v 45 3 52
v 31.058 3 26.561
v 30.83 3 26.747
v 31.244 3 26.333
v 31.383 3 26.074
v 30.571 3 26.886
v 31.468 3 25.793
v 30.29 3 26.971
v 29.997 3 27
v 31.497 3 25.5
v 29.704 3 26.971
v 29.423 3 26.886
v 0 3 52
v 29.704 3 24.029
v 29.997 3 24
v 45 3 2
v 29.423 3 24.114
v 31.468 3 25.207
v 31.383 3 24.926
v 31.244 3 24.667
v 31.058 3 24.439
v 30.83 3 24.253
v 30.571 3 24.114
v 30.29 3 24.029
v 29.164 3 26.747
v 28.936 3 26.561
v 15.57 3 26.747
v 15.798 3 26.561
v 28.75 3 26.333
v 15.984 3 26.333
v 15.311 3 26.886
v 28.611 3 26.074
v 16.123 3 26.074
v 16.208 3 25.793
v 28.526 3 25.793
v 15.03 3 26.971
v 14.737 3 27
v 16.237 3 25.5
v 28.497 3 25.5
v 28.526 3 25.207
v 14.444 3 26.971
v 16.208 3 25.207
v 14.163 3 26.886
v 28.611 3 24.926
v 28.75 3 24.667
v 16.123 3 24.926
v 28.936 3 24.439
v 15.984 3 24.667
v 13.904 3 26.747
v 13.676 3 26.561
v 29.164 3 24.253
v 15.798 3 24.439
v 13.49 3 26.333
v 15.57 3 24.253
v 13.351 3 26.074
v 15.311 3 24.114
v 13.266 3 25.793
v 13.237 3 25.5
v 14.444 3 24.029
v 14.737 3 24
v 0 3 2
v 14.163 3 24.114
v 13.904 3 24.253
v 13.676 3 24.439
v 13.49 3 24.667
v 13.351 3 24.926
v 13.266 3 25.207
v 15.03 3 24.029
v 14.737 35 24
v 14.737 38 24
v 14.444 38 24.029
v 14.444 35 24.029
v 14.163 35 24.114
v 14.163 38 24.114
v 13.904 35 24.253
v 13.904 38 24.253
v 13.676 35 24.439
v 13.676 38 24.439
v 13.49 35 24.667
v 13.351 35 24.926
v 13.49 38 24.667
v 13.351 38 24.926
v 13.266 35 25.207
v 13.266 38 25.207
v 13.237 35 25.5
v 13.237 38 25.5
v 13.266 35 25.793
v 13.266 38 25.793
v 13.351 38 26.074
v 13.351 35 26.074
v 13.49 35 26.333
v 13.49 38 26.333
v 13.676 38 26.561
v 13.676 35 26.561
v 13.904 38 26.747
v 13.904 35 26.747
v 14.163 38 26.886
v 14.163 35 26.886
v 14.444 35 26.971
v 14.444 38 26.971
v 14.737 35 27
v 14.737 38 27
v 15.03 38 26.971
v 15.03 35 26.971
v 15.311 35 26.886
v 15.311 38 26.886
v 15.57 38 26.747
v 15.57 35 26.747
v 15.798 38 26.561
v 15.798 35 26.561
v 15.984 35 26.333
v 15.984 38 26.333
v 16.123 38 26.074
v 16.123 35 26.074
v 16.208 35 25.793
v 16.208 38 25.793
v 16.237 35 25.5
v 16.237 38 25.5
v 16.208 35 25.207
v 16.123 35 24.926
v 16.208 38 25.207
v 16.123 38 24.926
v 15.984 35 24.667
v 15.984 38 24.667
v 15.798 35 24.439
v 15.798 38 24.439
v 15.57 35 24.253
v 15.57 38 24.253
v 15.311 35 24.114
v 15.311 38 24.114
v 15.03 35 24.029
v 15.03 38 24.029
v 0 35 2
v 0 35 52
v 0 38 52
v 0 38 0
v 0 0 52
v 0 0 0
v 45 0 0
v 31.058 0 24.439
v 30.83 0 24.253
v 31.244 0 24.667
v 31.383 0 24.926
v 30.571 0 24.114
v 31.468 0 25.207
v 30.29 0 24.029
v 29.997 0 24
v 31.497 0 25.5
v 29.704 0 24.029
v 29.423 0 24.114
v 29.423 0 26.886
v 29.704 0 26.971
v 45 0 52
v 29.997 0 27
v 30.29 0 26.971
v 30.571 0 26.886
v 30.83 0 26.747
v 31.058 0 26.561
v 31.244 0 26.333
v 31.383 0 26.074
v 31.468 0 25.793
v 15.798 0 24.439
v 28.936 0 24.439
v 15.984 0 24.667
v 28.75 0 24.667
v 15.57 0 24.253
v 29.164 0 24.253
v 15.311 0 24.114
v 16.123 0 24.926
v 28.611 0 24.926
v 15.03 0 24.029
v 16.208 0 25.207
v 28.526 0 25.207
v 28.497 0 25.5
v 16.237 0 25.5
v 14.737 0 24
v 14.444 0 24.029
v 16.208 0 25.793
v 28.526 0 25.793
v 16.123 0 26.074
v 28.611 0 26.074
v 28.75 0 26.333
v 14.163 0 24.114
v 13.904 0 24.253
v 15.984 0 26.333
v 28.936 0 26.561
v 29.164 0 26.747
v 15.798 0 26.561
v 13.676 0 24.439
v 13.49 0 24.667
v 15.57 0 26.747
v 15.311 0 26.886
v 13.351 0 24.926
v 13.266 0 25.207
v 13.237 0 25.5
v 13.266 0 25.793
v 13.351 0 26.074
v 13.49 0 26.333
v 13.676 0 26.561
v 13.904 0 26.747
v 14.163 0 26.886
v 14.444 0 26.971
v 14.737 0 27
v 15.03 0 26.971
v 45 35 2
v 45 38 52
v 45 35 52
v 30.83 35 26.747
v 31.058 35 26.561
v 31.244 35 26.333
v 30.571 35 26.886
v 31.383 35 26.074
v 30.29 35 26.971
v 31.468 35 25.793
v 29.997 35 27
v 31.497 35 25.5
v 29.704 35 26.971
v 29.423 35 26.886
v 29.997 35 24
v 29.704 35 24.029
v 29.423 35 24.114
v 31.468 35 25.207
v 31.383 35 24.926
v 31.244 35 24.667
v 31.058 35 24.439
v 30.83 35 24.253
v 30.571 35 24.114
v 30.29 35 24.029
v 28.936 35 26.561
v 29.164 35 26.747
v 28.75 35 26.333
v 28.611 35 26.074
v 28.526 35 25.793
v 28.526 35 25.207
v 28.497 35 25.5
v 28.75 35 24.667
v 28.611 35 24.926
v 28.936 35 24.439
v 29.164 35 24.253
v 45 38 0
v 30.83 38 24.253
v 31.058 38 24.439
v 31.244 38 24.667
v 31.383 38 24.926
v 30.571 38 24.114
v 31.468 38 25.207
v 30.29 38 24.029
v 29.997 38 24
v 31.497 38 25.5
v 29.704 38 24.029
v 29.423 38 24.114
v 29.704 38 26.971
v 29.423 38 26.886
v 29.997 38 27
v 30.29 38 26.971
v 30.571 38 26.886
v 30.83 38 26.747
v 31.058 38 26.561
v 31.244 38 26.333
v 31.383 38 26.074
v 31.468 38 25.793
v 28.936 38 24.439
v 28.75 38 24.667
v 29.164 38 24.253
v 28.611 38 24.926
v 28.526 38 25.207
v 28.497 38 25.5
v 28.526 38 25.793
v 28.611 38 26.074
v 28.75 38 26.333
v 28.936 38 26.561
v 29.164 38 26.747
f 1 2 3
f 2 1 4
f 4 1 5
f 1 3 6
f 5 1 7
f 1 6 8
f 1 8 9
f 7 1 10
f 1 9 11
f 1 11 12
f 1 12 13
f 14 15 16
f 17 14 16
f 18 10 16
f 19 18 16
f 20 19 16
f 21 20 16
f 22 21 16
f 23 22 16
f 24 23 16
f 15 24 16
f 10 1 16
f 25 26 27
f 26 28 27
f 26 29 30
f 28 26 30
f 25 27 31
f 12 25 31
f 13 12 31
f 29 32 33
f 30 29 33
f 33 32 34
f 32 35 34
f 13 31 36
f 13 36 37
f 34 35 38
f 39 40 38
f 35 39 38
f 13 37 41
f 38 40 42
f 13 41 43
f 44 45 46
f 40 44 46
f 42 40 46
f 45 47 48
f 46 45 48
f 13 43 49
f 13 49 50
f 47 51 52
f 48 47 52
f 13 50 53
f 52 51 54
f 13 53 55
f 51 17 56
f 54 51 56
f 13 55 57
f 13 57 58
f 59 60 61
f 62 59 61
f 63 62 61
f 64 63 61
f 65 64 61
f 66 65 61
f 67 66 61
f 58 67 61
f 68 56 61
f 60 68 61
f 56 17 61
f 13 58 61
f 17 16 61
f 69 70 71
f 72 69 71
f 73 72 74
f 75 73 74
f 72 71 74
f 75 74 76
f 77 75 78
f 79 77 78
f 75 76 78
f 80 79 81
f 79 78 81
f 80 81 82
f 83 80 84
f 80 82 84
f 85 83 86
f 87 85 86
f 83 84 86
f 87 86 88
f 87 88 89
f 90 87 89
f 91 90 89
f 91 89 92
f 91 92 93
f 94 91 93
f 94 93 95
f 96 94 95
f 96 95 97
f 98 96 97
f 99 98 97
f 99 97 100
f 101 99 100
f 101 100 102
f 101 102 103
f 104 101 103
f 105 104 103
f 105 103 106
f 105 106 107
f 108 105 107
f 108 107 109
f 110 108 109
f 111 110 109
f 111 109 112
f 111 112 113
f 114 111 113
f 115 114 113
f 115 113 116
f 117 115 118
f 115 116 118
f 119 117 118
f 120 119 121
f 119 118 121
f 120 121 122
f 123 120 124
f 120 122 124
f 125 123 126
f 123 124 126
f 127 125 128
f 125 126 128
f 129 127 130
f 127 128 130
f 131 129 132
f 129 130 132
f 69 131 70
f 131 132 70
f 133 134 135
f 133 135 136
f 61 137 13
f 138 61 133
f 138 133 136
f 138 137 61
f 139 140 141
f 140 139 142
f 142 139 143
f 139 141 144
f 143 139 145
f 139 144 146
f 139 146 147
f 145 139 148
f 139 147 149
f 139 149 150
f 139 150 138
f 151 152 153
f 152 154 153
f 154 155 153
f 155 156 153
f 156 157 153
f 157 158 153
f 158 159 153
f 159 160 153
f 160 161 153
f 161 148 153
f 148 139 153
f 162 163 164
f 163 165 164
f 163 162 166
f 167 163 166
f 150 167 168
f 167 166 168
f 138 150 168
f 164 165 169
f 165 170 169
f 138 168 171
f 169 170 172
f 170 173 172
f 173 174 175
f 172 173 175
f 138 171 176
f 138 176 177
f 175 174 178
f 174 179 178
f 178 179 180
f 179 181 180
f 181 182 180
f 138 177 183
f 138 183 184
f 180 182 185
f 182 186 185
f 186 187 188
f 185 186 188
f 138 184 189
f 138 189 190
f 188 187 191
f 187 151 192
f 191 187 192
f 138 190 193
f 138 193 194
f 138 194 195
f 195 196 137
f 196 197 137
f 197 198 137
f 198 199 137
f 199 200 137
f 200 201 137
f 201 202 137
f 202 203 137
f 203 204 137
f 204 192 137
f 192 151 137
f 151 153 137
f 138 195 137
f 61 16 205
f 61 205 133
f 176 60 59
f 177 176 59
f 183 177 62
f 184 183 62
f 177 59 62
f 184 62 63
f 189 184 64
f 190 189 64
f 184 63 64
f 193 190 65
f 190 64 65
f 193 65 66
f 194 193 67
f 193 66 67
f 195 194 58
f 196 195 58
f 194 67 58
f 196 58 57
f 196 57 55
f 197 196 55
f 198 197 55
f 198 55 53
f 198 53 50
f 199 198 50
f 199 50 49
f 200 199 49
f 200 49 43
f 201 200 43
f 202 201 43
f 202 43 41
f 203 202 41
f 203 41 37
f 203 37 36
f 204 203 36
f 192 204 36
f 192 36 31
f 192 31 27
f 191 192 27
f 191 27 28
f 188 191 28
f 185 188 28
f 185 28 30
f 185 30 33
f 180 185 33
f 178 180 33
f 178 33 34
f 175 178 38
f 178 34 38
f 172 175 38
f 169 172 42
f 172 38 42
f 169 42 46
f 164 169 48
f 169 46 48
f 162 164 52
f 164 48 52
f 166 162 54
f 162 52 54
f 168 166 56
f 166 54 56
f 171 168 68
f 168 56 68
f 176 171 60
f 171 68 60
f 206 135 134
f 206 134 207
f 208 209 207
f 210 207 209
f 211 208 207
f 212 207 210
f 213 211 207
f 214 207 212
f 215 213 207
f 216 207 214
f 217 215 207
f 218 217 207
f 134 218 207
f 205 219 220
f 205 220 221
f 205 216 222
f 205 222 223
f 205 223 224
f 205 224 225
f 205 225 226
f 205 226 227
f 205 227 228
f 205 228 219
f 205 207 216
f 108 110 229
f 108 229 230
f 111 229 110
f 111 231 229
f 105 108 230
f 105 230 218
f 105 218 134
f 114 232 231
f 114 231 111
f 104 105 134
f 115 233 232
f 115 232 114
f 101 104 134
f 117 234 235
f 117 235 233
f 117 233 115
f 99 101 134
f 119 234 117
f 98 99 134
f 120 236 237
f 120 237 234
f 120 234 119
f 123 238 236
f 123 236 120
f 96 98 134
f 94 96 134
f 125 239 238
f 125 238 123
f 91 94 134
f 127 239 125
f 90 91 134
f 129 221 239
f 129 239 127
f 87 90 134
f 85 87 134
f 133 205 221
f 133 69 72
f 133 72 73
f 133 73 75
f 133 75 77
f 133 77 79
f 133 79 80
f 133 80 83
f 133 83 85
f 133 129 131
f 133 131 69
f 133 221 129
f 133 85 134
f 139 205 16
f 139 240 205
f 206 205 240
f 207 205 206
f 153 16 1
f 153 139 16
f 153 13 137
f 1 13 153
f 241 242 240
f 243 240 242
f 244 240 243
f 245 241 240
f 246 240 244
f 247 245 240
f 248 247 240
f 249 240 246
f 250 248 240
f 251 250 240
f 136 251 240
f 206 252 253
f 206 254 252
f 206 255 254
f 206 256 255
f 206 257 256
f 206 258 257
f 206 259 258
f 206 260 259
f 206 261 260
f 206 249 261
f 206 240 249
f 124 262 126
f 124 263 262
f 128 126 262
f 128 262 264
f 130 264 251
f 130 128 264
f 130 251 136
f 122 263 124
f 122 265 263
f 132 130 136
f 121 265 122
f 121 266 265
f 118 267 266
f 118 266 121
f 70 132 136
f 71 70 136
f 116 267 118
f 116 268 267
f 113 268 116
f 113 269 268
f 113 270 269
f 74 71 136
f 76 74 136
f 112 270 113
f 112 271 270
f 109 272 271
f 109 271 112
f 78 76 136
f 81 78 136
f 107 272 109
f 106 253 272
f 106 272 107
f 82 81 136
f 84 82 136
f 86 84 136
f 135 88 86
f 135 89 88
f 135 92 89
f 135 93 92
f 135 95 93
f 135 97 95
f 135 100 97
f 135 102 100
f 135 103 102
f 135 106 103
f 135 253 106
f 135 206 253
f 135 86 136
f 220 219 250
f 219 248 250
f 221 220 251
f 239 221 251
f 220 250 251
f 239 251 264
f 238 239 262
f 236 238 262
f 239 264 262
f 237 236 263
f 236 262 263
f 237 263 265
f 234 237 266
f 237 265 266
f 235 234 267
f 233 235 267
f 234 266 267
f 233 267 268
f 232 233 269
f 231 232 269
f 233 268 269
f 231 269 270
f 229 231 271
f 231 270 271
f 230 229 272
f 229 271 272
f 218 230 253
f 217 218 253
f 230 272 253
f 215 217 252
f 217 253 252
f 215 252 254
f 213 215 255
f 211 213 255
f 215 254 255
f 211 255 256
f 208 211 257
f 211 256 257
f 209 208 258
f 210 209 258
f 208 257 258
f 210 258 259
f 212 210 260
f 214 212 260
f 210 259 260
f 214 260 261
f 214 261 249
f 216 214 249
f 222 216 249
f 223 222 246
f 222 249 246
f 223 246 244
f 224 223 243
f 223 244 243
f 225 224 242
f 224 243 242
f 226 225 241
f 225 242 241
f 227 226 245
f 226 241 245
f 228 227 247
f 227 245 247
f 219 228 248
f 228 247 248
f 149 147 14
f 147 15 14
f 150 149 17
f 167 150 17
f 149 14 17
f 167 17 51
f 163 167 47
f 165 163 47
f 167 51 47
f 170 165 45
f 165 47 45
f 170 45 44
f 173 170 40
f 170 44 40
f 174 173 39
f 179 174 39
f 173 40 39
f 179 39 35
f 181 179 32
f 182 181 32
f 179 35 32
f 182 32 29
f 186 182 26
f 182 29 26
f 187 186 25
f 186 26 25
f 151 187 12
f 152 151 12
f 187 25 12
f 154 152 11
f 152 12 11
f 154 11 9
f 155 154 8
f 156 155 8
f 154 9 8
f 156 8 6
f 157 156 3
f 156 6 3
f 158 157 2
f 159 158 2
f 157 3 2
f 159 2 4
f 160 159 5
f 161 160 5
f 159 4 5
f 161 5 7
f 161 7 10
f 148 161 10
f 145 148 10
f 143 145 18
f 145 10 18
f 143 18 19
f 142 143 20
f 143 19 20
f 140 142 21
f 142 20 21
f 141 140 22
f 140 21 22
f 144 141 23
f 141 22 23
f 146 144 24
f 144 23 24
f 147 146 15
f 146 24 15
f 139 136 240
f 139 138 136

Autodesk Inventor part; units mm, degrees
ref_plane "YZ Plane" through (0, 0, 0) normal (1, 0, 0) x (0, 1, 0)
ref_plane "XZ Plane" through (0, 0, 0) normal (0, 1, 0) x (-1, 0, 0)
ref_plane "XY Plane" through (0, 0, 0) normal (0, 0, 1) x (1, 0, 0)
sketch "スケッチ1" plane through (0, 0, 0) normal (0, 1, 0) x (-1, 0, 0)
  line L0 (0, 0) -> (-45, 0)
  line L1 (-45, 0) -> (-45, 2)
  line L2 (-45, 2) -> (0, 2)
  line L3 (0, 2) -> (0, 0)
  dimension "d0" = 45
  dimension "d1" = 2
extrude "押し出し1" add sketch "スケッチ1" along normal blind 38
sketch "スケッチ2" plane through (0, 0, 2) normal (0, 0, 1) x (1, 0, 0)
  line L0 (45, 0) -> (0, 0) projected
  line L1 (45, 0) -> (45, 38) projected
  line L2 (0, 38) -> (45, 38)
  line L3 (45, 38) -> (45, 35)
  line L4 (45, 35) -> (0, 35)
  line L5 (0, 35) -> (0, 38)
  line L6 (0, 0) -> (45, 0)
  line L7 (45, 0) -> (45, 3)
  line L8 (45, 3) -> (0, 3)
  line L9 (0, 3) -> (0, 0)
  dimension "d4" = 3
  dimension "d5" = 3
extrude "押し出し2" add sketch "スケッチ2" along normal blind 50
sketch "スケッチ3" plane through (0, 38, 0) normal (0, 1, 0) x (1, 0, 0)
  line L0 (45, 0) -> (0, 0) projected
  line L1 (0, 0) -> (0, -52) projected
  line L2 (45, -52) -> (0, -52) projected
  line L3 (45, 0) -> (45, -52) projected
sketch "スケッチ4" plane through (0, 0, 0) normal (0, -1, 0) x (1, 0, 0)
  line L0 (0, 0) -> (45, 0) projected
  line L1 (14.737, 0) -> (29.997, 0)
  line L2 (29.997, 0) -> (29.997, 25.5)
  line L3 (29.997, 25.5) -> (14.737, 25.5)
  line L4 (14.737, 25.5) -> (14.737, 0)
  dimension "d8" = 15.26
  dimension "d9" = 25.5
hole "穴1" at (14.737, 0, 25.5) at (29.997, 0, 25.5) direction (0, 1, 0) diameter 3 depth 40 tip angle 118
properties part number "知能ロボコンギアボックス１"
